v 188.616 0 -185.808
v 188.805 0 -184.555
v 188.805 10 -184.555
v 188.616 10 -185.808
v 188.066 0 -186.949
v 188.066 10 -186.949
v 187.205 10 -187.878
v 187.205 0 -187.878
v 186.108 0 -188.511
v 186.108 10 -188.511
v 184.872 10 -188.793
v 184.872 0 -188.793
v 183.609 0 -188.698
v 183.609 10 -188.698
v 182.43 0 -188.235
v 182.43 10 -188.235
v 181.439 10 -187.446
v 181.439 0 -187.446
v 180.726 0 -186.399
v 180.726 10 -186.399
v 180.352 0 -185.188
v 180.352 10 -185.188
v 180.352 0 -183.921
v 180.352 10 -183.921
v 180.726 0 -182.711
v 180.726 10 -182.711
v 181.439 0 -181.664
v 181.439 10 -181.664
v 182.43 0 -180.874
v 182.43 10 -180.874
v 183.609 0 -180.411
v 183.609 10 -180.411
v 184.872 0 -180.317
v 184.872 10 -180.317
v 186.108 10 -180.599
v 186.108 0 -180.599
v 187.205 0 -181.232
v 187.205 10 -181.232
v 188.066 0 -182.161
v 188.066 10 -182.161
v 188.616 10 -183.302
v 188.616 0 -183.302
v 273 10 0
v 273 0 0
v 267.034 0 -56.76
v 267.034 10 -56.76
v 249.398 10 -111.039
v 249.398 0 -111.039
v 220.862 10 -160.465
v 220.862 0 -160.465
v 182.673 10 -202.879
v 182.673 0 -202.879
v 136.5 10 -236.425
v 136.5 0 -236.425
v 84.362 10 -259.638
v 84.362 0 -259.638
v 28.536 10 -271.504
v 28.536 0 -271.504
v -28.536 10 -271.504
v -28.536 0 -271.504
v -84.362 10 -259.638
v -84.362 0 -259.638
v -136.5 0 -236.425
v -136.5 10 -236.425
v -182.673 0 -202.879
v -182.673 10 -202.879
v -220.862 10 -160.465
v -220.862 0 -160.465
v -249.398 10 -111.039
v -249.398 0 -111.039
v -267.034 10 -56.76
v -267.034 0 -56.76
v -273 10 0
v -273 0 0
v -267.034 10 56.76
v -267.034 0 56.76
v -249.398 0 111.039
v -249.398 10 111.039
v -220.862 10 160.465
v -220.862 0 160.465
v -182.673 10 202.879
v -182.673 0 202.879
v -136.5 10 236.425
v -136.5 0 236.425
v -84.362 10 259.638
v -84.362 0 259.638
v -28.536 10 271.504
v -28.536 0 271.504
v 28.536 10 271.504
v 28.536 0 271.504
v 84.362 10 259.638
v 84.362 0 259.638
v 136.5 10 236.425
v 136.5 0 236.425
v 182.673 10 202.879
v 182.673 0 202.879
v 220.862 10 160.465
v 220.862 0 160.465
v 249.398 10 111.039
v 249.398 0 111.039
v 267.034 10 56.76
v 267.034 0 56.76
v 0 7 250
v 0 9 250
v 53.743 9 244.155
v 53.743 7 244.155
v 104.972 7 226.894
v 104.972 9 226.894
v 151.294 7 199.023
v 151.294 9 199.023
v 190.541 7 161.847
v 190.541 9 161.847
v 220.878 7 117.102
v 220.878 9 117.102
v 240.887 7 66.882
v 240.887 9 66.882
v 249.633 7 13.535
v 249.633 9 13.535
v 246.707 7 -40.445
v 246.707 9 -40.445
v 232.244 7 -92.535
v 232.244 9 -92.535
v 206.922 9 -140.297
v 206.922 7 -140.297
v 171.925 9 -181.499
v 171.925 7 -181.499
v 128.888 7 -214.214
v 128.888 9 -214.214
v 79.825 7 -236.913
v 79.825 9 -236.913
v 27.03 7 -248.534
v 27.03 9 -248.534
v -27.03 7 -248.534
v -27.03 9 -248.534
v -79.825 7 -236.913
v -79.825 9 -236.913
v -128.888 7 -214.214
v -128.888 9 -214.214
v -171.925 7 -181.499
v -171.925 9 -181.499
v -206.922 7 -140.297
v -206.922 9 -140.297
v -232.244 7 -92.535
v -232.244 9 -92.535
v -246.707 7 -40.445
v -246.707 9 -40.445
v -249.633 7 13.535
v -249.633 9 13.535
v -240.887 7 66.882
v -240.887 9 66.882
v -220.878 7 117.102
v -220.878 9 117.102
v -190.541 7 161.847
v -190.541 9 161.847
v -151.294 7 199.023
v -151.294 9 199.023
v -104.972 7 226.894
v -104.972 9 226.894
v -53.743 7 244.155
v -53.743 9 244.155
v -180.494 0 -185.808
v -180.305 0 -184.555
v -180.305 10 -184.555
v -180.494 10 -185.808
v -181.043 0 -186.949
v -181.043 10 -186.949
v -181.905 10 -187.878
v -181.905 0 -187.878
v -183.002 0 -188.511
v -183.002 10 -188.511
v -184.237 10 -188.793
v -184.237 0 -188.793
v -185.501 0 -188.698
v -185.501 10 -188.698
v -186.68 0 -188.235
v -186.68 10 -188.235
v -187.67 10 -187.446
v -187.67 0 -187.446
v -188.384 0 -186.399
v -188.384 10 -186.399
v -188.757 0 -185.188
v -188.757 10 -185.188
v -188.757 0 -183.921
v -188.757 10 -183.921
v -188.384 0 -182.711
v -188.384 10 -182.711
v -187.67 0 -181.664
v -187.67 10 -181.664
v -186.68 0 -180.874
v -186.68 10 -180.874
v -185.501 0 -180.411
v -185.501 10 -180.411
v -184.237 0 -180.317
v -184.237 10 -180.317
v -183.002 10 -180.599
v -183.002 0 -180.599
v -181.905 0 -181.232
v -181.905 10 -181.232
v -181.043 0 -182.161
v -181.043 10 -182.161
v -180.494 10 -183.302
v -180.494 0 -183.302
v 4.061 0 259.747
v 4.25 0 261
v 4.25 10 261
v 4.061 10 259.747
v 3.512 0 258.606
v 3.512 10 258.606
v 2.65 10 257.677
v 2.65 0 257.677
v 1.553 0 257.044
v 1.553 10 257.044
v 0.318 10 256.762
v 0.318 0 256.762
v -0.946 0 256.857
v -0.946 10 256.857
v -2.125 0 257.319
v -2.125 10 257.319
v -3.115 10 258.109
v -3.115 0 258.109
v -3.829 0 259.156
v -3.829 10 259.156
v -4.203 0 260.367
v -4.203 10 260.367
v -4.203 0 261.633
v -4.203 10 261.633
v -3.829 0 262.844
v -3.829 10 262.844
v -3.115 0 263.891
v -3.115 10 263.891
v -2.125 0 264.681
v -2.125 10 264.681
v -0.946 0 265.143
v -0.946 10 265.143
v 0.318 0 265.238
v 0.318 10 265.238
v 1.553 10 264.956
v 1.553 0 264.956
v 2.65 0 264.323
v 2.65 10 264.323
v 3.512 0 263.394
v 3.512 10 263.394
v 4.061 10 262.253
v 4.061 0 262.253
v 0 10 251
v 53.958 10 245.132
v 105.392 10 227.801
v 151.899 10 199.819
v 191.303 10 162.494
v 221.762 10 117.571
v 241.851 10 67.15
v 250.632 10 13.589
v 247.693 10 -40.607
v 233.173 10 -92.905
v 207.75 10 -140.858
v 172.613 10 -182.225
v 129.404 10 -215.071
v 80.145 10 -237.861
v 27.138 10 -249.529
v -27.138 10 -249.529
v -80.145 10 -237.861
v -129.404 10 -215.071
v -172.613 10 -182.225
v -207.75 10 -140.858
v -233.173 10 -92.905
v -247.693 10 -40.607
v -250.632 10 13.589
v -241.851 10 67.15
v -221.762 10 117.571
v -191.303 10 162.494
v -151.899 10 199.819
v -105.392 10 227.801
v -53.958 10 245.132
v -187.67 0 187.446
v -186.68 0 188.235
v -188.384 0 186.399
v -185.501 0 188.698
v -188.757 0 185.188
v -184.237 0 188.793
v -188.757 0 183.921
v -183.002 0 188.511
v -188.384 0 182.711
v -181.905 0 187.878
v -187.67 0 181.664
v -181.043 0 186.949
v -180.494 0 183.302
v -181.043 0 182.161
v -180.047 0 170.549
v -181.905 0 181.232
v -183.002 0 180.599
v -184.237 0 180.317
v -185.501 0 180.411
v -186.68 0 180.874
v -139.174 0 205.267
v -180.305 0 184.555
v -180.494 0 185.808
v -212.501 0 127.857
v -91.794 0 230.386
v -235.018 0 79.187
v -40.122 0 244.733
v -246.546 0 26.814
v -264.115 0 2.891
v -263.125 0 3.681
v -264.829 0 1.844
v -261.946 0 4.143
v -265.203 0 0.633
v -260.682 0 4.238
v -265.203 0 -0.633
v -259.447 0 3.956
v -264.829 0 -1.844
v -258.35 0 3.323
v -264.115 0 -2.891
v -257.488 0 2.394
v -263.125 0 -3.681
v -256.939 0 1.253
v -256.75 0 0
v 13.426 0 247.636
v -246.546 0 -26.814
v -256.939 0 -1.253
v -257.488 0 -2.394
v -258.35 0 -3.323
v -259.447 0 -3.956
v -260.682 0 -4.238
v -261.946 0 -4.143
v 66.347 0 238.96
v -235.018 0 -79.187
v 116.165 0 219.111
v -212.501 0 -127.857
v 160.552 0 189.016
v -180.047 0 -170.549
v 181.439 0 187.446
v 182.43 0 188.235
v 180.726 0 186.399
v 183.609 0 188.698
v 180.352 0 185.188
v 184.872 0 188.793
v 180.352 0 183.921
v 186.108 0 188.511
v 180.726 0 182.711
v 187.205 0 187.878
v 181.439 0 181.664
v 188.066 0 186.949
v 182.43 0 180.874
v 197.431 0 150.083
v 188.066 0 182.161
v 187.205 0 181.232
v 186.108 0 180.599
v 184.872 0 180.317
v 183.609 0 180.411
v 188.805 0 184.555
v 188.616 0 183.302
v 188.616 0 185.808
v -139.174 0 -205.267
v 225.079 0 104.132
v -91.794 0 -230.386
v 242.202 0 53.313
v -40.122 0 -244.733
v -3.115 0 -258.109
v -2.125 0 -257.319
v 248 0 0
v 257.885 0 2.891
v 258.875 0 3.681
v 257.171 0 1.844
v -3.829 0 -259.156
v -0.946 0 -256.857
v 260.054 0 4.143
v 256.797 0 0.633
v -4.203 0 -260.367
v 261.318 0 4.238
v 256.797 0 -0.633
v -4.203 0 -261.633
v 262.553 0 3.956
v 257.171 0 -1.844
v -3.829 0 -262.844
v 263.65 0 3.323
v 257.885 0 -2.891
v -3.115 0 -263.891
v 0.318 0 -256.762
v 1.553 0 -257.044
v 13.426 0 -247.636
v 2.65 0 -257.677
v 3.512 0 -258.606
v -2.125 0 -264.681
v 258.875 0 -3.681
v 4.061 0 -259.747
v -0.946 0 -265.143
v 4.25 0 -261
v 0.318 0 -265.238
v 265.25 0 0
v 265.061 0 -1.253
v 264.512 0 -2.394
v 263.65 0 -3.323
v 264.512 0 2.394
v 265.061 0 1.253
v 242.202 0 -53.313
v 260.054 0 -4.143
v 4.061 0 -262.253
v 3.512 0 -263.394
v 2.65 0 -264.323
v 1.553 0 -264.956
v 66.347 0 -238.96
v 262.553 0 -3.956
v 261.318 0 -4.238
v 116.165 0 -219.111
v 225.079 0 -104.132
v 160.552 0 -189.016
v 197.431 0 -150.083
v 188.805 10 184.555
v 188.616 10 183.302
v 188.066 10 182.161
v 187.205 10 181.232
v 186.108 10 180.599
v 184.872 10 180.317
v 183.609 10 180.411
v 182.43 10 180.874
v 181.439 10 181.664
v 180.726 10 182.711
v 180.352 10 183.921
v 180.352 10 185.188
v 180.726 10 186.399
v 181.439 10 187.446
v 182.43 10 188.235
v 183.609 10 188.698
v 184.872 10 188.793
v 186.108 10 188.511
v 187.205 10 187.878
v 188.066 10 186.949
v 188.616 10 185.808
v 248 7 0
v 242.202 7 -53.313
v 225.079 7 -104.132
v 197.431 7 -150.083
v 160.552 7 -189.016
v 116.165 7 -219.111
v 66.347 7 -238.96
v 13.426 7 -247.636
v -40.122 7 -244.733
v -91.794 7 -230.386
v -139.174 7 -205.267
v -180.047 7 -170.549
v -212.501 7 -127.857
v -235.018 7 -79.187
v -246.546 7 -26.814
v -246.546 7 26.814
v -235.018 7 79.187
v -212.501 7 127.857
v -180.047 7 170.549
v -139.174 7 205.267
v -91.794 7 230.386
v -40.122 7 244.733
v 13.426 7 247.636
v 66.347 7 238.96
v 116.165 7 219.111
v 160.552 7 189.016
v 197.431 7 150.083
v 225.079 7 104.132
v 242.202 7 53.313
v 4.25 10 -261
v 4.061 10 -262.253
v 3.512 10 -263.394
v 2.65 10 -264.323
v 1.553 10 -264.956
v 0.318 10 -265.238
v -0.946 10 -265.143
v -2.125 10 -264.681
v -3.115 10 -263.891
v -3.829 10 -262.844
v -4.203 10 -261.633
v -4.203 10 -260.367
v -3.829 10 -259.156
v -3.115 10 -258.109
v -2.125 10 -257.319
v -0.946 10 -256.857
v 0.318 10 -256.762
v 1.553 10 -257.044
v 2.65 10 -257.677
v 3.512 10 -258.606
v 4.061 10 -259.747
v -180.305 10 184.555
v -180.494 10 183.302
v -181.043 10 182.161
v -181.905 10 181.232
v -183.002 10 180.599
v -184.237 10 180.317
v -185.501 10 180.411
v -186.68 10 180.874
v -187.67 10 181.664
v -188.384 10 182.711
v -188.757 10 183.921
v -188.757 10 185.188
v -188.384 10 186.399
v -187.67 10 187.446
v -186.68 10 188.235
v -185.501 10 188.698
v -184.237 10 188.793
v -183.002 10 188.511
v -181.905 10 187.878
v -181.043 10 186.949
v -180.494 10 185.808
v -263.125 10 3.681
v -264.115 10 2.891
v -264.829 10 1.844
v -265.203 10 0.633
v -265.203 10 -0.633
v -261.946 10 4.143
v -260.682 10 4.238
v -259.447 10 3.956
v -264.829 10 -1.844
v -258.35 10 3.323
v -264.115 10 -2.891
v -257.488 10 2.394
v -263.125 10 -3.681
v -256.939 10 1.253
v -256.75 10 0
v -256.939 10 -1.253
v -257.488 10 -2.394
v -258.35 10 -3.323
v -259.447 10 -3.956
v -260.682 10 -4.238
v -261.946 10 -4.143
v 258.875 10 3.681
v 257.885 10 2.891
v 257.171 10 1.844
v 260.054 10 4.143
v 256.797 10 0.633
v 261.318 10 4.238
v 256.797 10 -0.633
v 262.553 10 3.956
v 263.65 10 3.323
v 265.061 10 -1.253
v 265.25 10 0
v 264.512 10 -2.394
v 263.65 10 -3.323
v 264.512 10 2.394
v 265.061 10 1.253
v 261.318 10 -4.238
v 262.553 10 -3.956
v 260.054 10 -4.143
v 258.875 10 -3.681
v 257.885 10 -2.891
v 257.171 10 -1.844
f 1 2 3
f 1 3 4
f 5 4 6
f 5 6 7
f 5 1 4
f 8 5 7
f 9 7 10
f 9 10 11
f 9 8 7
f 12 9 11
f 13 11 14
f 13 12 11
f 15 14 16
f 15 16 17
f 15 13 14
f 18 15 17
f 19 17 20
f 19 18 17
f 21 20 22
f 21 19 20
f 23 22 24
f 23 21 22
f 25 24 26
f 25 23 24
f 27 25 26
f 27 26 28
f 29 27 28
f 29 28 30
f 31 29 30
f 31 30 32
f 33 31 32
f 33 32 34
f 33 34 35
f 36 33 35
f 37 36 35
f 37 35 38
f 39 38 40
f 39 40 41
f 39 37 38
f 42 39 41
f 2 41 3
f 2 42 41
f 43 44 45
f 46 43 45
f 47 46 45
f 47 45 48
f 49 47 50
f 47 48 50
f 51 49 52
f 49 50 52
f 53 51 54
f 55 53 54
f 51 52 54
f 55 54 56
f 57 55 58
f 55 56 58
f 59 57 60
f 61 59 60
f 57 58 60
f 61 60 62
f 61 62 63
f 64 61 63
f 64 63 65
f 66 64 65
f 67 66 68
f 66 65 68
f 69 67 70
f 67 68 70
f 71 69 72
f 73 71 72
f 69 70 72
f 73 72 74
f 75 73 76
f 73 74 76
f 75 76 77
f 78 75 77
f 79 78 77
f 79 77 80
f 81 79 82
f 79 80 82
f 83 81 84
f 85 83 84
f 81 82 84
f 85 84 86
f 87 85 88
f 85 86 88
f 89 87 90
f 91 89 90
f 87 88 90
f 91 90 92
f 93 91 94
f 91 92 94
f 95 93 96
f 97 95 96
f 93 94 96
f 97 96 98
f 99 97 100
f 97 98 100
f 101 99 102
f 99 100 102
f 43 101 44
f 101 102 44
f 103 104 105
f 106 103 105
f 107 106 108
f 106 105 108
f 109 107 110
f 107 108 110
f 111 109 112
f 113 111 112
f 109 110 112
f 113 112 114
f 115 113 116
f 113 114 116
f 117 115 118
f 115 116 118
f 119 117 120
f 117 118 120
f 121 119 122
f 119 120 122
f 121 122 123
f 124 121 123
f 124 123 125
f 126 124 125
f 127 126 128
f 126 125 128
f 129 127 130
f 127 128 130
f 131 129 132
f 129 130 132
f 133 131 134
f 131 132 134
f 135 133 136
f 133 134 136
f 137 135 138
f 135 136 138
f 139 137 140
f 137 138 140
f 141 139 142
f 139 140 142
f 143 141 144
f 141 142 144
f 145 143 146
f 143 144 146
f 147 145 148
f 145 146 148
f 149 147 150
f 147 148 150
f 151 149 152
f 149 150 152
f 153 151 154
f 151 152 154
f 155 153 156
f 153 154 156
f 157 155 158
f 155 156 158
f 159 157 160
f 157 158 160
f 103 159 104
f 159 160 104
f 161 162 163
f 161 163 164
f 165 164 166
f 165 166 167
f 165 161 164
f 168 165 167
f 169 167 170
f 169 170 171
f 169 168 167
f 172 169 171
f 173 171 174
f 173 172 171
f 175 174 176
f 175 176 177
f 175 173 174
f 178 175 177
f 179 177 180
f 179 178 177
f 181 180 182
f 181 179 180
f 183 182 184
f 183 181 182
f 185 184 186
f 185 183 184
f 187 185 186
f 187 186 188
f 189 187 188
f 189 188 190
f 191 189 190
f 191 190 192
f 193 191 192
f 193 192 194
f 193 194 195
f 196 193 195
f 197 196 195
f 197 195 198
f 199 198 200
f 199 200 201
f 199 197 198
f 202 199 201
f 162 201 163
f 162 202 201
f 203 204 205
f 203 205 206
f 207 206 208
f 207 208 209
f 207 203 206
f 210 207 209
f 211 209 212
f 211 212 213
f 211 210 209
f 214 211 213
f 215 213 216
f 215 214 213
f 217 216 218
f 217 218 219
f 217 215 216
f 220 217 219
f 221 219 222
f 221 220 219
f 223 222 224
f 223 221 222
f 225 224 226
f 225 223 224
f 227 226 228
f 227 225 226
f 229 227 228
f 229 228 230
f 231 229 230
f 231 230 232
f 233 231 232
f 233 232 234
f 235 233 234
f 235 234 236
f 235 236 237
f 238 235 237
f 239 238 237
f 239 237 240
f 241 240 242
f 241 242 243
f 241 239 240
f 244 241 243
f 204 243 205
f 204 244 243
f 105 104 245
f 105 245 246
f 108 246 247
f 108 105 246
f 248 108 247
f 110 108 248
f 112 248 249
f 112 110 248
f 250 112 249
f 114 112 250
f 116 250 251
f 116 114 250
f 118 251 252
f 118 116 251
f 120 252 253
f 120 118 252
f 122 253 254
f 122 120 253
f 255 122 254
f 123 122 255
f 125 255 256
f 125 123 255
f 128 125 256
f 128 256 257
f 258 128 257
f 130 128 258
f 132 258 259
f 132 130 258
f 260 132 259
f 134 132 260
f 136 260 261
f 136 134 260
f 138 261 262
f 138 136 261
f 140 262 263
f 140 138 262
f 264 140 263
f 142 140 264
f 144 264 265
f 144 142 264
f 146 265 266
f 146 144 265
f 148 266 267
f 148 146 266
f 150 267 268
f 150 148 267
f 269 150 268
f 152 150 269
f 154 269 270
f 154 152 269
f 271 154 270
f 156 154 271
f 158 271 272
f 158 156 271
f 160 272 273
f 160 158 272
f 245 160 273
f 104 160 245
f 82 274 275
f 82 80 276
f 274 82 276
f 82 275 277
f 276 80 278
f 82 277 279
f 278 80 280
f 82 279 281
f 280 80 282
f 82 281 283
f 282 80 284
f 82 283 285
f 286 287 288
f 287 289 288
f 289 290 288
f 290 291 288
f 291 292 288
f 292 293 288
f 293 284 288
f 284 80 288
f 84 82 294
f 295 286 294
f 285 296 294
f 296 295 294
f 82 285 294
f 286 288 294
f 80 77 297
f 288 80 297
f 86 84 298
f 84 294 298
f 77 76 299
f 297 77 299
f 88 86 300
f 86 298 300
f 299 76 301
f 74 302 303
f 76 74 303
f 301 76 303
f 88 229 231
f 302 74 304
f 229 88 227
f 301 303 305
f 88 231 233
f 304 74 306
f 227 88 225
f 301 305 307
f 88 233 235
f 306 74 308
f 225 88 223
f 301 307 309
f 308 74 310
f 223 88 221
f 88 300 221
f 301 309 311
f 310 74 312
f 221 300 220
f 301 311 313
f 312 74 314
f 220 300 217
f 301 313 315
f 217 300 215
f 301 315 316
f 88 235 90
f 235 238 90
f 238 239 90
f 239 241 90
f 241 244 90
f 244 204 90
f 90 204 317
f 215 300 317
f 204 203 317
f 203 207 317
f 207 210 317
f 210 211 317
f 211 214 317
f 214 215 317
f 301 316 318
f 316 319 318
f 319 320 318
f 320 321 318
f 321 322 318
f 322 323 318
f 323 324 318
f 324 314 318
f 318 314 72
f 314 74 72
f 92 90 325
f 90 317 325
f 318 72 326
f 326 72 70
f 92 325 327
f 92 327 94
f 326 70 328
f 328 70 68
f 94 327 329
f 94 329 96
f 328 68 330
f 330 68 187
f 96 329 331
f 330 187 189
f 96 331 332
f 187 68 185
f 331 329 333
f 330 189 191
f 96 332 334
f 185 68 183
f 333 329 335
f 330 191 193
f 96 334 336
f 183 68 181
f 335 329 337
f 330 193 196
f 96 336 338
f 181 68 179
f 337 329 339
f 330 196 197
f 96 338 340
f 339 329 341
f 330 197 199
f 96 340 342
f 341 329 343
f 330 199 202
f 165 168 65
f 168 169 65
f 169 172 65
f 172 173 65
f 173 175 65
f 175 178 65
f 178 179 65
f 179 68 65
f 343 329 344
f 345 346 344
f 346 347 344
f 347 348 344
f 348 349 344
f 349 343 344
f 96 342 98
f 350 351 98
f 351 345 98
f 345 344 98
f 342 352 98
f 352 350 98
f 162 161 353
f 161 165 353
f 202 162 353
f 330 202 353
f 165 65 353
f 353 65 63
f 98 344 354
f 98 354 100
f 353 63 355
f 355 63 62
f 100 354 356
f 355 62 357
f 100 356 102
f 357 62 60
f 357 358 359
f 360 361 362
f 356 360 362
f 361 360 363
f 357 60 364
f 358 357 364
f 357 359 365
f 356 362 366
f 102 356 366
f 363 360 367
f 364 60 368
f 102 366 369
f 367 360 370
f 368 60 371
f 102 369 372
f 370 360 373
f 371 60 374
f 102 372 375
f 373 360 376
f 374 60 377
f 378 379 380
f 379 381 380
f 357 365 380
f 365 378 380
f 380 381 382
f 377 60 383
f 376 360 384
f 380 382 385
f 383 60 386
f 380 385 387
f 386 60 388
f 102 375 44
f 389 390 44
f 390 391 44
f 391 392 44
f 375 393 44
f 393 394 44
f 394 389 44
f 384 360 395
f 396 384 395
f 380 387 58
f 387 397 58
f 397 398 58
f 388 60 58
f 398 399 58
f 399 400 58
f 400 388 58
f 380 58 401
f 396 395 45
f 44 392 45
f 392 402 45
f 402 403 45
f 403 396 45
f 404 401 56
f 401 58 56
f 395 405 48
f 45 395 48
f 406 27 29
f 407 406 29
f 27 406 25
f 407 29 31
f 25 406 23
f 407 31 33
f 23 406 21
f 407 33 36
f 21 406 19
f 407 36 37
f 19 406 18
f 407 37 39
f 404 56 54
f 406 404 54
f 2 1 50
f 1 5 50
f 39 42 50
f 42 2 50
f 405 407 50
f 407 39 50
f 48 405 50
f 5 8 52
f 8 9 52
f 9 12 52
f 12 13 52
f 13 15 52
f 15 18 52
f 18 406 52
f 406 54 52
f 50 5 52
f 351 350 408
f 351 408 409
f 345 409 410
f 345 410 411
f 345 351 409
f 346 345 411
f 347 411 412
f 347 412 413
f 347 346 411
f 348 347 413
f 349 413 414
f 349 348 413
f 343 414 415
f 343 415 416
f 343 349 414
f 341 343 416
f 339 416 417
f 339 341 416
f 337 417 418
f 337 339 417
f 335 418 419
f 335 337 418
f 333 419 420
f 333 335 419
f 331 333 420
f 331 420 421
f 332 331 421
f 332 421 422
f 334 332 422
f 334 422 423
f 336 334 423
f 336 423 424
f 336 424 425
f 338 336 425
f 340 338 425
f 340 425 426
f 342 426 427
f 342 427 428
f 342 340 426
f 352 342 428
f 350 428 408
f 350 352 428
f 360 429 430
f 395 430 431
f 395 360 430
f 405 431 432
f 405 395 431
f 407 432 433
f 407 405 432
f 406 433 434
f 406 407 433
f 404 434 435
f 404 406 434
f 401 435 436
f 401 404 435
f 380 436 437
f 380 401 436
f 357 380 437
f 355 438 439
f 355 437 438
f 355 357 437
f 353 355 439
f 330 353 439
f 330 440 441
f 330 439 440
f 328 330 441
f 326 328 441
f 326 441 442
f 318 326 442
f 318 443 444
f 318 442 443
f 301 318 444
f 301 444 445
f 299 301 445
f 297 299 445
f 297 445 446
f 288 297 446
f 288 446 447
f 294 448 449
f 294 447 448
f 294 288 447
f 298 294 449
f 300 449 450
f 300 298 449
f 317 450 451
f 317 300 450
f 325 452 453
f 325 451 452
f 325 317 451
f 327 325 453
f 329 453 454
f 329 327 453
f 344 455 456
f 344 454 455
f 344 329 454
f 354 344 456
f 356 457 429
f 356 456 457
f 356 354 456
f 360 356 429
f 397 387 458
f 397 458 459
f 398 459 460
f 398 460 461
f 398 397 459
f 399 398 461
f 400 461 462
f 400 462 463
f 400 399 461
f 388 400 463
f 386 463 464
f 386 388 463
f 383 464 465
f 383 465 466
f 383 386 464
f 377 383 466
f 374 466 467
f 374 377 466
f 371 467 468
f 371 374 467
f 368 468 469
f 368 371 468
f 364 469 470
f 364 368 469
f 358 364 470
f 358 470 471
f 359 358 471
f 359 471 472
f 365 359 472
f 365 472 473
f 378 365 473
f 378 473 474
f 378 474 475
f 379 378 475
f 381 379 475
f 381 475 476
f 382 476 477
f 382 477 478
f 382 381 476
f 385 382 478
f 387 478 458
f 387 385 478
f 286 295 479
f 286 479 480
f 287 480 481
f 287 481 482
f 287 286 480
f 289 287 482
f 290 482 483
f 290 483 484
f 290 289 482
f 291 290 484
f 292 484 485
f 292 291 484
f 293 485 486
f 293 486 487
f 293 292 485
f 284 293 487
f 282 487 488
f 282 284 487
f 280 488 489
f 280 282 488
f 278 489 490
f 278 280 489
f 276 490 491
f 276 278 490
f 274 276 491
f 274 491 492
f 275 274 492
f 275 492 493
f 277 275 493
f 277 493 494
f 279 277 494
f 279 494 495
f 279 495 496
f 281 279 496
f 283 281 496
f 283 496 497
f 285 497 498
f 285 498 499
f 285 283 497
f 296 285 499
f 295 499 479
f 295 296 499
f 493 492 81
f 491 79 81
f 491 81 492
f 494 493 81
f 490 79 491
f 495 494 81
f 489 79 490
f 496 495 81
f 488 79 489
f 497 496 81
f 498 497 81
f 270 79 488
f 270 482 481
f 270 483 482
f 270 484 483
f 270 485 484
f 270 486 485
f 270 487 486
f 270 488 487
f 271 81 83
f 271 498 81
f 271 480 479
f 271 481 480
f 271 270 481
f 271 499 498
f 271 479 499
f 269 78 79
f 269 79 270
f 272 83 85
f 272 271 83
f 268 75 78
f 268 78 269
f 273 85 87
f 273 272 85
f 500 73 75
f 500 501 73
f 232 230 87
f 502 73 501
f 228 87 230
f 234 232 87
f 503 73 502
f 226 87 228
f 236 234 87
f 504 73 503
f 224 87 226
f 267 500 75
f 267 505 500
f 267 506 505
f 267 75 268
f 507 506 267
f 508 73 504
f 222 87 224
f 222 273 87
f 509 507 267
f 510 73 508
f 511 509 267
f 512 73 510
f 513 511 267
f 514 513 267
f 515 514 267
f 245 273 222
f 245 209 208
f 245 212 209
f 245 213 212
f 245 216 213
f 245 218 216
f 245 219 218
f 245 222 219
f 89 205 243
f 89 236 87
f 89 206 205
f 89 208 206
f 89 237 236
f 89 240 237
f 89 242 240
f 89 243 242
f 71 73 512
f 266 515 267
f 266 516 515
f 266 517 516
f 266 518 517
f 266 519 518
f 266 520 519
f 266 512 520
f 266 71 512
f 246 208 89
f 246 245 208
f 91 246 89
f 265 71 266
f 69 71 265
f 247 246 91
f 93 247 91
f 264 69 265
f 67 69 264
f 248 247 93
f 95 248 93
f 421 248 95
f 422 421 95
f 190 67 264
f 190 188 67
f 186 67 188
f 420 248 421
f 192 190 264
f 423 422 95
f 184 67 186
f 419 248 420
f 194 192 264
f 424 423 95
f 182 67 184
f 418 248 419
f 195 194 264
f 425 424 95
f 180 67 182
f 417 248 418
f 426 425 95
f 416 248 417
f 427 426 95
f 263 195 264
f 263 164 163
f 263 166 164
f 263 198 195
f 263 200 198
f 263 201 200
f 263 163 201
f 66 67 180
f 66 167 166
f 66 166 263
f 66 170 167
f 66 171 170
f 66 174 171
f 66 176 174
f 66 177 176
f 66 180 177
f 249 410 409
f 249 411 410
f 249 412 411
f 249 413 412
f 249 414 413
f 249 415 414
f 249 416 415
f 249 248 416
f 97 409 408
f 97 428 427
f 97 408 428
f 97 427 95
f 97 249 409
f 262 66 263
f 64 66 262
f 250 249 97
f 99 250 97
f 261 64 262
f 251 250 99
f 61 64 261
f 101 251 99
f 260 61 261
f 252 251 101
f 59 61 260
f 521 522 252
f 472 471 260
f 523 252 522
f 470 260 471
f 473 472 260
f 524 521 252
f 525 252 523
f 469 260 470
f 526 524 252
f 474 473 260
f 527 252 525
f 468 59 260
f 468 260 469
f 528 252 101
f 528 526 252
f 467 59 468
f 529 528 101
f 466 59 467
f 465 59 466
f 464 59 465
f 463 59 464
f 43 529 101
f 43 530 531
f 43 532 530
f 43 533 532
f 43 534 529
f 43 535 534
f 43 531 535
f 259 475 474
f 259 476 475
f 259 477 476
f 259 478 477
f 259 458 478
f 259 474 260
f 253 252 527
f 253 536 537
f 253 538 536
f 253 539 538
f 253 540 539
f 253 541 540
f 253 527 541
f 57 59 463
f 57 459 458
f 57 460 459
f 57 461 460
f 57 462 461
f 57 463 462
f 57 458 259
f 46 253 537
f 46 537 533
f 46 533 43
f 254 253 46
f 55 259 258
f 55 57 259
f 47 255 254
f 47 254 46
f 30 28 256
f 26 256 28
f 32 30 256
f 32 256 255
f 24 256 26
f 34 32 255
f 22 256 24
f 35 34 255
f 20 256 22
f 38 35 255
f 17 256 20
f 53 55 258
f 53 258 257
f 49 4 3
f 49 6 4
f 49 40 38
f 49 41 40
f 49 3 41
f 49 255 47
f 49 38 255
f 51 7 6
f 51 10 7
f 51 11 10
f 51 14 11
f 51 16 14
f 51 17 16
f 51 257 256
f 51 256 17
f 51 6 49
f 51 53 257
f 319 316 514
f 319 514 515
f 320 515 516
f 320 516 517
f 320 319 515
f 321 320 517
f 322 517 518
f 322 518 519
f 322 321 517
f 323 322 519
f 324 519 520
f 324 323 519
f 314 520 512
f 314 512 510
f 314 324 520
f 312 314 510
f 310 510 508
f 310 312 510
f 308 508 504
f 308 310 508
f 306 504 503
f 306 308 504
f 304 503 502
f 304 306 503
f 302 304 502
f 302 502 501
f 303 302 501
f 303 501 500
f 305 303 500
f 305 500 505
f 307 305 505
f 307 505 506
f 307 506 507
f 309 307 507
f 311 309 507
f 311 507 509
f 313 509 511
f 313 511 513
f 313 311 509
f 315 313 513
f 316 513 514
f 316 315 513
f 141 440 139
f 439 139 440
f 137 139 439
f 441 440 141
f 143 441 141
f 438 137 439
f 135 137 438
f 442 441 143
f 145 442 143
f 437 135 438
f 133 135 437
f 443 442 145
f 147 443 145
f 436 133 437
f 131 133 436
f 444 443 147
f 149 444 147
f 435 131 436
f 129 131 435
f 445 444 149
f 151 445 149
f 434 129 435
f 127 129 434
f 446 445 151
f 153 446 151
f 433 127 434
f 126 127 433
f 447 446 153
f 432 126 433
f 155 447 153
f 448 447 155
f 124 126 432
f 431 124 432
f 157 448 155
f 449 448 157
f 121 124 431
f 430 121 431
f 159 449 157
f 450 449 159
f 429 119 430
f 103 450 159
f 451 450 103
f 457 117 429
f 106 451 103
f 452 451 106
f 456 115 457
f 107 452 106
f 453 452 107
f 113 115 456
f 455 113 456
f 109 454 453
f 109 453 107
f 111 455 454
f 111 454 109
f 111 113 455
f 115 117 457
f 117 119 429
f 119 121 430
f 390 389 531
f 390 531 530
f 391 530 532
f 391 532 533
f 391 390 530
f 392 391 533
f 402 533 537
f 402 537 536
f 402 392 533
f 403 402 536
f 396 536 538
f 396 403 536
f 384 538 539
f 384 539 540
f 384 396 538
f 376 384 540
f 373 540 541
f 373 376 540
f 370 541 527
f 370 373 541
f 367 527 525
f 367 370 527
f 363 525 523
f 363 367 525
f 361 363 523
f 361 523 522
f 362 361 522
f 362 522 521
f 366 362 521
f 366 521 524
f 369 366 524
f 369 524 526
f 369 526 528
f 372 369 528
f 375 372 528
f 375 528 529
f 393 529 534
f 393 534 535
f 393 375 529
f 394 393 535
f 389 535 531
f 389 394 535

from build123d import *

# Parameters (mm, degrees)
BOSS_EXTRUDE1_OUTLINE_R   = 273
BOSS_EXTRUDE1_OUTLINE_R_2 = 4.25
BOSS_EXTRUDE1_OUTLINE_R_3 = 248
BOSS_EXTRUDE1_DEPTH       = 10
SKETCH2_R                 = 250
CUT_EXTRUDE1_DEPTH        = 3
CHAMFER1_SIZE             = 1


# Read off the part's stored shape, not the designer's step: Boss-Extrude1
with BuildPart() as part:
    # Boss-Extrude1 outline → Boss-Extrude1 (new body)
    with BuildSketch(Plane(origin=(0, 0, 0), x_dir=(1, 0, 0), z_dir=(0, 1, 0))):
        Circle(BOSS_EXTRUDE1_OUTLINE_R)
        with Locations((-184.55486989, -184.55486989)):
            Circle(BOSS_EXTRUDE1_OUTLINE_R_2, mode=Mode.SUBTRACT)
        with Locations((0, -261)):
            Circle(BOSS_EXTRUDE1_OUTLINE_R_2, mode=Mode.SUBTRACT)
        with Locations((184.55486989, -184.55486989)):
            Circle(BOSS_EXTRUDE1_OUTLINE_R_2, mode=Mode.SUBTRACT)
        with Locations((-261, 0)):
            Circle(BOSS_EXTRUDE1_OUTLINE_R_2, mode=Mode.SUBTRACT)
        with Locations((-184.55486989, 184.55486989)):
            Circle(BOSS_EXTRUDE1_OUTLINE_R_2, mode=Mode.SUBTRACT)
        Circle(BOSS_EXTRUDE1_OUTLINE_R_3, mode=Mode.SUBTRACT)
        with Locations((261, 0)):
            Circle(BOSS_EXTRUDE1_OUTLINE_R_2, mode=Mode.SUBTRACT)
        with Locations((0, 261)):
            Circle(BOSS_EXTRUDE1_OUTLINE_R_2, mode=Mode.SUBTRACT)
        with Locations((184.55486989, 184.55486989)):
            Circle(BOSS_EXTRUDE1_OUTLINE_R_2, mode=Mode.SUBTRACT)
    extrude(amount=BOSS_EXTRUDE1_DEPTH)

    # Sketch2 → Cut-Extrude1 (cut)
    with BuildSketch(Plane(origin=(0, 10, 0), x_dir=(1, 0, 0), z_dir=(0, 1, 0))):
        with Locations(Location((0, 0, 0), (0, 0, 270))):
            Circle(SKETCH2_R)
    extrude(amount=-CUT_EXTRUDE1_DEPTH, mode=Mode.SUBTRACT)

    # Chamfer1
    chamfer1_edges = [part.edges().sort_by_distance(p)[0] for p in [
        (0, 10, -250),
    ]]
    chamfer(chamfer1_edges, length=CHAMFER1_SIZE)


solid = part.part
